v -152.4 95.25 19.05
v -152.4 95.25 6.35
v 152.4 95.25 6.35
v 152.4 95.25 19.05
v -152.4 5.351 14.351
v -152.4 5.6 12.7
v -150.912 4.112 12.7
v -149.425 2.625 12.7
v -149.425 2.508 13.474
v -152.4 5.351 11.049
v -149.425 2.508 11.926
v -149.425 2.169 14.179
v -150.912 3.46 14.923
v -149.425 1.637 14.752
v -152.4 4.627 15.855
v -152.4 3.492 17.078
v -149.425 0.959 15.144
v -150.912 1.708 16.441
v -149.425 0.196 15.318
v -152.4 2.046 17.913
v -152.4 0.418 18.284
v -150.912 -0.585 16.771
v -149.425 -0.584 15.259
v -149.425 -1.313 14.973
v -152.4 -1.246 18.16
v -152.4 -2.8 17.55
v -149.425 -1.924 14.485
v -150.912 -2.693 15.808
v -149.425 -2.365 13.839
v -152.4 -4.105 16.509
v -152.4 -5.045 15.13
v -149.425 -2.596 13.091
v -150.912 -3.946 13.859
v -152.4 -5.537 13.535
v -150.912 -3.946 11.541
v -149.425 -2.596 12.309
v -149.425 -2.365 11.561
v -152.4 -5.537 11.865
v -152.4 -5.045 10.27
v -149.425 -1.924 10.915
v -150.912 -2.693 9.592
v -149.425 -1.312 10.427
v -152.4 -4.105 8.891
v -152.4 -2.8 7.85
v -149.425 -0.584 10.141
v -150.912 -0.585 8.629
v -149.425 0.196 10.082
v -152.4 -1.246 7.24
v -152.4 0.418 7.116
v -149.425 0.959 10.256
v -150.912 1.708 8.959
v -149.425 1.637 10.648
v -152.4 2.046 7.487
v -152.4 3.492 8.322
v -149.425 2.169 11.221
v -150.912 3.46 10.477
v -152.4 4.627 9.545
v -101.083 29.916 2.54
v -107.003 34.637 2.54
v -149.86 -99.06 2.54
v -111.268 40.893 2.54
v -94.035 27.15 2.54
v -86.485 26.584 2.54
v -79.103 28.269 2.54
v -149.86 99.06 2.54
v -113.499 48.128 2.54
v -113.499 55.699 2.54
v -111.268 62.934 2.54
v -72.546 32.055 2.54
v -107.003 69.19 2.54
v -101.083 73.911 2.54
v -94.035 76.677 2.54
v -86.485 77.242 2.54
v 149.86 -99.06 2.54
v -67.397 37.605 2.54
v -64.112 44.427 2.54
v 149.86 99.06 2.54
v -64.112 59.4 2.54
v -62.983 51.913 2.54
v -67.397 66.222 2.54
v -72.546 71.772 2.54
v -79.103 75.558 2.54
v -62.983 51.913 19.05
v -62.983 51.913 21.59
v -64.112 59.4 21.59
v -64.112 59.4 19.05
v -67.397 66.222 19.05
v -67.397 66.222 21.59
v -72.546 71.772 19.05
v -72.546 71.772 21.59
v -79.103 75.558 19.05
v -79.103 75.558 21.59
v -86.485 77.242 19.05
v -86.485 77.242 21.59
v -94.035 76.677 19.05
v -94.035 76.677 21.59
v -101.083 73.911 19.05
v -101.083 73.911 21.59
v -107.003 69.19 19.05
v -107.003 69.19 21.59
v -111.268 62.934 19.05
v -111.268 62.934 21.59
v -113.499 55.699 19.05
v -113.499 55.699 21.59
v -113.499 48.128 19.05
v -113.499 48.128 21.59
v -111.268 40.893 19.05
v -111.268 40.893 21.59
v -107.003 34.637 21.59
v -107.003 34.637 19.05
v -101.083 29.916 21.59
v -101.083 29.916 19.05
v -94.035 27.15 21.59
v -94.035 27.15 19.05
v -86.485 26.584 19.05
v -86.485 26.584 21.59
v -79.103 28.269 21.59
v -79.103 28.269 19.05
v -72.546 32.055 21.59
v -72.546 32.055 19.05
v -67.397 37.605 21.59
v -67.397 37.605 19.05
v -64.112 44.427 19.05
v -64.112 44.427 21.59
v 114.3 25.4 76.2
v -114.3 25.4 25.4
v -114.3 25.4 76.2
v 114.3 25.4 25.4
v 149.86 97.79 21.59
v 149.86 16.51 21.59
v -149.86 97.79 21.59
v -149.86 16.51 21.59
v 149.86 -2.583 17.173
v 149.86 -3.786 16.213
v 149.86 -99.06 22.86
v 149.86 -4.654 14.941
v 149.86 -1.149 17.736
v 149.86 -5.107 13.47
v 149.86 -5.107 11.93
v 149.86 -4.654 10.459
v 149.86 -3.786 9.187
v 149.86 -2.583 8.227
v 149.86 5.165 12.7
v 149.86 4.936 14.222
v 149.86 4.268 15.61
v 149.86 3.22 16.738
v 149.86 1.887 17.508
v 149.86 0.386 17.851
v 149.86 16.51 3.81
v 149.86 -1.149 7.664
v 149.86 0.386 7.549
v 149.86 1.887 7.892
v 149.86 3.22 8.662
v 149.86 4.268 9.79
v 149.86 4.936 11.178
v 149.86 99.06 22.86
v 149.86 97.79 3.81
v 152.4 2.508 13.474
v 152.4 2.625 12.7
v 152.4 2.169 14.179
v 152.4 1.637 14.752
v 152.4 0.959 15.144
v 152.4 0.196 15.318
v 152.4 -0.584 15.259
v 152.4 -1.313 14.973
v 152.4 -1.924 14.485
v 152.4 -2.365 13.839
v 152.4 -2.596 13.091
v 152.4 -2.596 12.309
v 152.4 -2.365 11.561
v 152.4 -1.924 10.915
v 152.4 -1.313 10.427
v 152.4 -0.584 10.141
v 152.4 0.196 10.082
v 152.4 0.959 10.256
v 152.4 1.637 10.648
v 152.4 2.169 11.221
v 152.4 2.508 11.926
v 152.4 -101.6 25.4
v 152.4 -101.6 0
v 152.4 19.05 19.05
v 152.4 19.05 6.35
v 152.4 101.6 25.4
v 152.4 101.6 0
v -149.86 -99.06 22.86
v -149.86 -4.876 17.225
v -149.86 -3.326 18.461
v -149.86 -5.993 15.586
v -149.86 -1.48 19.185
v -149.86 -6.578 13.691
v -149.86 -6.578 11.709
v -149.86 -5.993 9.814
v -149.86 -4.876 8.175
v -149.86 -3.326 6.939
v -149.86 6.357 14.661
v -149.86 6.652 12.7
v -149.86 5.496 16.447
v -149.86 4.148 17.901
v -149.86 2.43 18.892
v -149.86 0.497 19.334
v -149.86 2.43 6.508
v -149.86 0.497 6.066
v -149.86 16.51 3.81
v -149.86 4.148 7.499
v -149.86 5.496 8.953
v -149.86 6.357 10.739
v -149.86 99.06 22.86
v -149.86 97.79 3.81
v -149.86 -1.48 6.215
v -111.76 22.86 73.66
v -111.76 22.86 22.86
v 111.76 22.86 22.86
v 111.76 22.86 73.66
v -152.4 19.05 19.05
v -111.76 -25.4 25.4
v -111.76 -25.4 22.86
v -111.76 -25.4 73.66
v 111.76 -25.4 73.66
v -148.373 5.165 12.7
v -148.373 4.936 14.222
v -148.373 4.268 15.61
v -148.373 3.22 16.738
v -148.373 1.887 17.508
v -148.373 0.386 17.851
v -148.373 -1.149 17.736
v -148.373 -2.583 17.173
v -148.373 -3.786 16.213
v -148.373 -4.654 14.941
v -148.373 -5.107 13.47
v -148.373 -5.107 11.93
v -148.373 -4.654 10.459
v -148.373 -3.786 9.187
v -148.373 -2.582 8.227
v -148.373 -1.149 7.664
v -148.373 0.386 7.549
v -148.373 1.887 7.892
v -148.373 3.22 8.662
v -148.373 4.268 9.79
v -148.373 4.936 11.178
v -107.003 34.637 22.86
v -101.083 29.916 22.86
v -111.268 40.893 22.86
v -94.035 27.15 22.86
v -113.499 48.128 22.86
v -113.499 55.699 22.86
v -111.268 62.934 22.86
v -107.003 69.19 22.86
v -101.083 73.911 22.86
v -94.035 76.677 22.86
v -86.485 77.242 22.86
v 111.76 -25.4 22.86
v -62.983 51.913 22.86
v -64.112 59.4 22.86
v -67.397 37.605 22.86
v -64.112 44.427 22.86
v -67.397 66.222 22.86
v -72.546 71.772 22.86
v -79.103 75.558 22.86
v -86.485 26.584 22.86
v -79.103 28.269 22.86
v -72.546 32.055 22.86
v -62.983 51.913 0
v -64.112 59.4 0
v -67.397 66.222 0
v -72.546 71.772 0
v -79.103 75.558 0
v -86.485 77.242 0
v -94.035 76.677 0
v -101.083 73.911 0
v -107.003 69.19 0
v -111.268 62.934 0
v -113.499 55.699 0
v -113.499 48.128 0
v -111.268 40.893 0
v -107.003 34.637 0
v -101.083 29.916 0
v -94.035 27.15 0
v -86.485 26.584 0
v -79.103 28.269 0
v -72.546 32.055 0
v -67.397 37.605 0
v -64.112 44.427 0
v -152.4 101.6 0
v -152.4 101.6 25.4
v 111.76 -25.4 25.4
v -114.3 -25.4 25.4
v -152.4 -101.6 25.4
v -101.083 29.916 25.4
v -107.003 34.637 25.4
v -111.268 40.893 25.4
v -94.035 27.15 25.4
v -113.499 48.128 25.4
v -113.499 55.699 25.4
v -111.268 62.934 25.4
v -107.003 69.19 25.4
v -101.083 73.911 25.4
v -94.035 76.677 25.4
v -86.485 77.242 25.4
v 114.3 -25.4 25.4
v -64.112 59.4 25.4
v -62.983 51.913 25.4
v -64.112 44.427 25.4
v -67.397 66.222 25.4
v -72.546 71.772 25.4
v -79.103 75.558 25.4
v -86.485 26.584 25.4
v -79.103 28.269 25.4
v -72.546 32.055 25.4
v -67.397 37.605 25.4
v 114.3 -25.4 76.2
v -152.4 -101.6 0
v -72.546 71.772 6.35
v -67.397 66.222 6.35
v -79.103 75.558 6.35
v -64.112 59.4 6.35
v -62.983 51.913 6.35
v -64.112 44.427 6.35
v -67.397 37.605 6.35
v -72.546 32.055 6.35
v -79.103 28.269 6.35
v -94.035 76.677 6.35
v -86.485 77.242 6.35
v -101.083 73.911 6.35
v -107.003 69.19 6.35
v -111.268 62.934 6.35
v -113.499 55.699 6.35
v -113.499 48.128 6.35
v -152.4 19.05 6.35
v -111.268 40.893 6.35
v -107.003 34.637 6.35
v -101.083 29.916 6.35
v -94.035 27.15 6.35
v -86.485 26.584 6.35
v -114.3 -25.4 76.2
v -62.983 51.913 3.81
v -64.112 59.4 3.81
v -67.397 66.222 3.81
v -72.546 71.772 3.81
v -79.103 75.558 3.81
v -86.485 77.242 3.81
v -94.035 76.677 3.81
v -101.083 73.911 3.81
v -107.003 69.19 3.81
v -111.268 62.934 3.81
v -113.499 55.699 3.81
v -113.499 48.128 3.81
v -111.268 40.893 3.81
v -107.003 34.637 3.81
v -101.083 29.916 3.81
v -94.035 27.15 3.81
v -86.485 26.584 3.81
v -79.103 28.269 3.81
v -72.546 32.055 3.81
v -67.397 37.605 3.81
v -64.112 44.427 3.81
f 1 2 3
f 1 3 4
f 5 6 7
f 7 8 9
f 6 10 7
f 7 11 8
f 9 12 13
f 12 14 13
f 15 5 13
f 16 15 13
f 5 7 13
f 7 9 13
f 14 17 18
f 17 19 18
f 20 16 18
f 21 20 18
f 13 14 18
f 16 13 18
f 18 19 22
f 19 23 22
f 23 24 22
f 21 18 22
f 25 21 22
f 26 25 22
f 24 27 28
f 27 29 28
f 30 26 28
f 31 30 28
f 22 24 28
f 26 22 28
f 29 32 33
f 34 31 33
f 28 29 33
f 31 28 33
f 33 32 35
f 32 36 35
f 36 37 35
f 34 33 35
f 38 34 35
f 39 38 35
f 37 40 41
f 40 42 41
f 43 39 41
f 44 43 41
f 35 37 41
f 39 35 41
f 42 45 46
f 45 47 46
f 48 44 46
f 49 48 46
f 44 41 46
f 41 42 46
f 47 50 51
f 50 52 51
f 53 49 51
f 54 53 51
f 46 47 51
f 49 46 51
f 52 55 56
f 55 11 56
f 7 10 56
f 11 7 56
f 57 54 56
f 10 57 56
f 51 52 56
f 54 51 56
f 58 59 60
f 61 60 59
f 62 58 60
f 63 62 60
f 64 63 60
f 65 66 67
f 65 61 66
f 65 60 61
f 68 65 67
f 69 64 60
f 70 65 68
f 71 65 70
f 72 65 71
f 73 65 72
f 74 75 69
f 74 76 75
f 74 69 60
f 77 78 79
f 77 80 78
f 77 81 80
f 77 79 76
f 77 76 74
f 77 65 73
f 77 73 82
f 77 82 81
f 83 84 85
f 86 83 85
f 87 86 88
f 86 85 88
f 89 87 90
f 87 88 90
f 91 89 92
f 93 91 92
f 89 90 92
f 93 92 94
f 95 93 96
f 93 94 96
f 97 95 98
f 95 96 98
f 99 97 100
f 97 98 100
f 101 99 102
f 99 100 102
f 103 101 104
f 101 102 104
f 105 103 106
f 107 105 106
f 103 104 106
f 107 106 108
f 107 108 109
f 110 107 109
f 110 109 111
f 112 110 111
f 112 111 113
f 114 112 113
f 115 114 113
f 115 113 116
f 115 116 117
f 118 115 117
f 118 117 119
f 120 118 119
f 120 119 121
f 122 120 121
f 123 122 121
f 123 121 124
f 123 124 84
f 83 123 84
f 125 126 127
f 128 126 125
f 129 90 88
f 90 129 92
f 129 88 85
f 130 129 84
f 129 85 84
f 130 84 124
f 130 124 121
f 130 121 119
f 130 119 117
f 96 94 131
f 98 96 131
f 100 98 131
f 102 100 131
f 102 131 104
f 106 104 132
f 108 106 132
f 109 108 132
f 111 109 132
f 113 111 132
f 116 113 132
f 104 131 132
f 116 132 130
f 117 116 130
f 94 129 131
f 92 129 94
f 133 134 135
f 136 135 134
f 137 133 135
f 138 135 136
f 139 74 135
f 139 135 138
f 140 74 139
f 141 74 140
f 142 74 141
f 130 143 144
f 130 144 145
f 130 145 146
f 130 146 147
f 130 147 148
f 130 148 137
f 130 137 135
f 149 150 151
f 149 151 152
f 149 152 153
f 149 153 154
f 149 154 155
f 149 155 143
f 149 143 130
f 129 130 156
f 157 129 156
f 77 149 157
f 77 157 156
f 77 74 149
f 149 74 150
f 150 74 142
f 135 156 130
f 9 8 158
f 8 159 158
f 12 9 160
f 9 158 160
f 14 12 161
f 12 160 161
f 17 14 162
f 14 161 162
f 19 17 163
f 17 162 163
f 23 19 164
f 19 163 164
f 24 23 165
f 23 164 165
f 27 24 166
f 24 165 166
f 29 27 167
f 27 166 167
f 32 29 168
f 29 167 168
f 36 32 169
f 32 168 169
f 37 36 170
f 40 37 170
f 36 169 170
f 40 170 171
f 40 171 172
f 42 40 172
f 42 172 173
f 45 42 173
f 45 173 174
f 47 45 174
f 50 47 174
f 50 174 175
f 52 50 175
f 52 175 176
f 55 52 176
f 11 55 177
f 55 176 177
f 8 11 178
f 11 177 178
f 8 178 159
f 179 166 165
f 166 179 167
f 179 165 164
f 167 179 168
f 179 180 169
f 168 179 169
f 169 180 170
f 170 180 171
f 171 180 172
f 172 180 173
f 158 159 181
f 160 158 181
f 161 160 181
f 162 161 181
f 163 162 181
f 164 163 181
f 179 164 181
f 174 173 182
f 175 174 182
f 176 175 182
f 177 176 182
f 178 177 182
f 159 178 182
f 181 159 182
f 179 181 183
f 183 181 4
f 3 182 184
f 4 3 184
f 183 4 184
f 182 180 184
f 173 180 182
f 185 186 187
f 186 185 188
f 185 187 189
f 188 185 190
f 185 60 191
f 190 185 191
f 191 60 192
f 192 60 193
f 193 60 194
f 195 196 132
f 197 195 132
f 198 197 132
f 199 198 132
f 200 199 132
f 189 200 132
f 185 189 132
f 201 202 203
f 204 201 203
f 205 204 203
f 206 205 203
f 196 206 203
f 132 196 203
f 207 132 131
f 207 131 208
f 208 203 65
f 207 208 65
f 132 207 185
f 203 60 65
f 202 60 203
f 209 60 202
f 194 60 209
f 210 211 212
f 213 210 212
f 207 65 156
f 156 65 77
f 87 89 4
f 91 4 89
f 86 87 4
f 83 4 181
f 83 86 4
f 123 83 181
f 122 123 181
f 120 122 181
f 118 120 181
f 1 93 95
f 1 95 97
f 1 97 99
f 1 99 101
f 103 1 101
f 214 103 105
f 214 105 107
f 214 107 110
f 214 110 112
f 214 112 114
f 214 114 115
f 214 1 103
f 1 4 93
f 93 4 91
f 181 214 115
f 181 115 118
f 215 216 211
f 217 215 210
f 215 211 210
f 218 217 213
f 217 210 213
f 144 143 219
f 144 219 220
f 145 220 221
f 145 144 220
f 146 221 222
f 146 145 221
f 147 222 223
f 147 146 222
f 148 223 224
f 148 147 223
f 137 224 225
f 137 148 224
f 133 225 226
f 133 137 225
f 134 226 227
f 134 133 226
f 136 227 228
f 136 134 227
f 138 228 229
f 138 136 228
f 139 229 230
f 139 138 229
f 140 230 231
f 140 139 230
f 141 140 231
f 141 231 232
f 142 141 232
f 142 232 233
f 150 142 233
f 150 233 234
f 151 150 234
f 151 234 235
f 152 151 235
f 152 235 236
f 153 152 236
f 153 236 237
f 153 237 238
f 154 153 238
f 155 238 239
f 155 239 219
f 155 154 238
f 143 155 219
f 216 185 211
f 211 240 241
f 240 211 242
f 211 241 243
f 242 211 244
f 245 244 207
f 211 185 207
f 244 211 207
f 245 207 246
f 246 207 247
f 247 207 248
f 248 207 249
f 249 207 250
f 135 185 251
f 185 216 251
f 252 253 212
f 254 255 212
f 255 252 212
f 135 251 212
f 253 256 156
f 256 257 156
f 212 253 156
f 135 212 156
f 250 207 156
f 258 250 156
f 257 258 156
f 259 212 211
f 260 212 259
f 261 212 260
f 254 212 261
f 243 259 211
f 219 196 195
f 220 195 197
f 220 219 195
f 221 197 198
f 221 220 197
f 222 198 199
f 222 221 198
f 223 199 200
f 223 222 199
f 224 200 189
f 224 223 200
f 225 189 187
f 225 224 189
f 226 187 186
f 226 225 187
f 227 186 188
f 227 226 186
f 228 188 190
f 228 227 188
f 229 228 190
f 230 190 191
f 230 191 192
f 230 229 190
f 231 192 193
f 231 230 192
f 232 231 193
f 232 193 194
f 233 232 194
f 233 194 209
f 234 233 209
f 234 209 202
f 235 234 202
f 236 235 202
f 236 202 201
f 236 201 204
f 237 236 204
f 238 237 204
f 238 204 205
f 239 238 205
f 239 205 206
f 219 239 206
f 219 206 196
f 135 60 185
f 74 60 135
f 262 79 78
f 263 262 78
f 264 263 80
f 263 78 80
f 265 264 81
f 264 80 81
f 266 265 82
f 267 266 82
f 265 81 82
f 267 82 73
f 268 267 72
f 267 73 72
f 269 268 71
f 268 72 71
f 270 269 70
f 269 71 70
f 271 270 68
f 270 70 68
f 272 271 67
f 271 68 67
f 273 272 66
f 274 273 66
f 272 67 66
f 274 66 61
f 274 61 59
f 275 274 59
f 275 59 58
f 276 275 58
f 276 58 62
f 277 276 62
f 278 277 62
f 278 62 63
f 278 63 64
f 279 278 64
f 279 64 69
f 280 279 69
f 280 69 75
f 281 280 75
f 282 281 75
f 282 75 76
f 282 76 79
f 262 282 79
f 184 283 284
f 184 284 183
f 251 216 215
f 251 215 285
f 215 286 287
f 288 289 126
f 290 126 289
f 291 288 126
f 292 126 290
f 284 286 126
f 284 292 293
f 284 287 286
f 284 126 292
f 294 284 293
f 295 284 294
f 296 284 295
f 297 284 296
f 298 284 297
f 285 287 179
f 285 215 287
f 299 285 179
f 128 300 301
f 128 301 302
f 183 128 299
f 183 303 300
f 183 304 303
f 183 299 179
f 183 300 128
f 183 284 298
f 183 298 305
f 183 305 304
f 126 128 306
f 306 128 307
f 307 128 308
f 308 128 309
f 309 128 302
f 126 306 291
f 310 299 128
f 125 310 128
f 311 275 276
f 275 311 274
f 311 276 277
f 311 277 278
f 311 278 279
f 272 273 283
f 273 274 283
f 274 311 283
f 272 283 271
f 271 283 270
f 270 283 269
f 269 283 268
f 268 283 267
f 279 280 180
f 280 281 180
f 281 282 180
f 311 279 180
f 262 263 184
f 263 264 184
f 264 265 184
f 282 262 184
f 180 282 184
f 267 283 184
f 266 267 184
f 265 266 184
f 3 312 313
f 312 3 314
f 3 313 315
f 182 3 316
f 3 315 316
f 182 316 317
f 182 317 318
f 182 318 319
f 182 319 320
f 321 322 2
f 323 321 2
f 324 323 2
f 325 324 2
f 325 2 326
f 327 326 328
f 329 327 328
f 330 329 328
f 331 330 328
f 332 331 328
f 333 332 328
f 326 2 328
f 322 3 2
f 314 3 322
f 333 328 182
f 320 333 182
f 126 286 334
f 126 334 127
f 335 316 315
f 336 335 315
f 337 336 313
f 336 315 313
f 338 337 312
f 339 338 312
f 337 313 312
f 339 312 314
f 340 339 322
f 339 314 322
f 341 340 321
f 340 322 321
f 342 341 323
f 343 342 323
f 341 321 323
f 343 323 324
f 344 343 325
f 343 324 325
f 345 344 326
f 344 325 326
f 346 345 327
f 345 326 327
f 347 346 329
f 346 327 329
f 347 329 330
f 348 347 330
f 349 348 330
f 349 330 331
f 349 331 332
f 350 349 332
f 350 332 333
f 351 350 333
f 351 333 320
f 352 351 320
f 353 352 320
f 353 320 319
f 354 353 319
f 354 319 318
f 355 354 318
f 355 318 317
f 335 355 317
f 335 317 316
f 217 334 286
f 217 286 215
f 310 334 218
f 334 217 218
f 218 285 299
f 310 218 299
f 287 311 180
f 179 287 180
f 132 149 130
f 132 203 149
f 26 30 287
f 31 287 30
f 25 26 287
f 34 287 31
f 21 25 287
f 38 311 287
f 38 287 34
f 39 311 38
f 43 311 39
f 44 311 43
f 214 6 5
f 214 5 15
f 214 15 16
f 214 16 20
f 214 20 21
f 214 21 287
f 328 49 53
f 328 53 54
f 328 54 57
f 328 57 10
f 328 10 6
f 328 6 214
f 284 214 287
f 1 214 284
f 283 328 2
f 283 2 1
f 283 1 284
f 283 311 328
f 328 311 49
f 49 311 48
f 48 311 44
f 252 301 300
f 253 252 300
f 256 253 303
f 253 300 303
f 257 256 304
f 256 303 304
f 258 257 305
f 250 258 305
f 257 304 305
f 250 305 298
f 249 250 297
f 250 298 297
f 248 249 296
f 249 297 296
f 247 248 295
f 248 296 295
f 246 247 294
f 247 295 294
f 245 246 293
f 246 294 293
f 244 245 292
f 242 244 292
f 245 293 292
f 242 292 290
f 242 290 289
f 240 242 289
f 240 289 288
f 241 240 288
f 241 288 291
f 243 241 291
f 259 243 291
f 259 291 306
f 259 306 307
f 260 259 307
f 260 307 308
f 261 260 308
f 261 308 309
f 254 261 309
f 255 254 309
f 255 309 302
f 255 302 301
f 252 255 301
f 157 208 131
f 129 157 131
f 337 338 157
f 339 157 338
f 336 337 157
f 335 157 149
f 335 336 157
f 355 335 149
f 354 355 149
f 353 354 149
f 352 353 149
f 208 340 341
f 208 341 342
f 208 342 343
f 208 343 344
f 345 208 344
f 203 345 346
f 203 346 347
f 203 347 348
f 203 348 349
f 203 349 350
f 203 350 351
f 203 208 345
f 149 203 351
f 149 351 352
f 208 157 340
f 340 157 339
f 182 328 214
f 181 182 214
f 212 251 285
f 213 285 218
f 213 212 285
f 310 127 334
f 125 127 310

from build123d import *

# Parameters (mm, degrees)
F0_W           = 304.8
F0_H           = 203.2
F1_DEPTH       = 25.4
F2_W           = 76.2
F2_H           = 12.7
F3_DEPTH       = 378.206
F6_D           = 5.25
F6_CSINK_D     = 11.2
F6_CSINK_ANGLE = 90
F7_W           = 228.6
F7_H           = 50.8
F8_DEPTH       = 50.8
F9_T           = -2.54
F4_R           = 25.4
F13_DEPTH      = 25.4


# Not quite as in the source:
# - a shell that OpenCascade refuses in one call is made with other operations: the cavity is built on its own and cut out
# - the program builds the solid bodies; features that only make, move or delete a surface that nothing else refers to are left out


with BuildPart() as f1:
    # F0 (on Top) → F1 (new body)
    with BuildSketch(Plane.XY):
        Rectangle(F0_W, F0_H)
    extrude(amount=F1_DEPTH)

    # F2 (on face) → F3 (cut)
    with BuildSketch(Plane(origin=(-152.4, 0, 0), x_dir=(0, -1, 0), z_dir=(-1, 0, 0))):
        with Locations((-57.15, 12.7)):
            Rectangle(F2_W, F2_H)
    extrude(amount=-F3_DEPTH, mode=Mode.SUBTRACT)

    # F6 (through all)
    with Locations(Plane(origin=(-152.4, 0, 0), x_dir=(0, -1, 0), z_dir=(-1, 0, 0))):
        with Locations((0, 12.7)):
            CounterSinkHole(F6_D / 2, F6_CSINK_D / 2, counter_sink_angle=F6_CSINK_ANGLE)

    # F7 (on face) → F8 (join)
    with BuildSketch(Plane.XY.offset(25.4)):
        Rectangle(F7_W, F7_H)
    extrude(amount=F8_DEPTH)

    # F9: a shell. OpenCascade refuses it in one call, so the cavity is built on its own and cut out:
    # the body offset inwards by the wall thickness, plus a prism from it out through each open face.
    f9_core = offset(f1.part, amount=F9_T, kind=Kind.INTERSECTION, mode=Mode.PRIVATE)
    f9_exits = [f9_core.faces().sort_by_distance(p)[0] for p in [
        (0, -22.86, 48.26),
    ]]
    add(f9_core, mode=Mode.SUBTRACT)
    extrude(f9_exits, amount=-F9_T, mode=Mode.SUBTRACT)

    # F4 (on face) → F13 (cut)
    with BuildSketch(Plane.XY.offset(25.4)):
        with Locations((-88.3831381798, 51.9134663045)):
            Circle(F4_R)
    extrude(amount=-F13_DEPTH, mode=Mode.SUBTRACT)


solid = f1.part
